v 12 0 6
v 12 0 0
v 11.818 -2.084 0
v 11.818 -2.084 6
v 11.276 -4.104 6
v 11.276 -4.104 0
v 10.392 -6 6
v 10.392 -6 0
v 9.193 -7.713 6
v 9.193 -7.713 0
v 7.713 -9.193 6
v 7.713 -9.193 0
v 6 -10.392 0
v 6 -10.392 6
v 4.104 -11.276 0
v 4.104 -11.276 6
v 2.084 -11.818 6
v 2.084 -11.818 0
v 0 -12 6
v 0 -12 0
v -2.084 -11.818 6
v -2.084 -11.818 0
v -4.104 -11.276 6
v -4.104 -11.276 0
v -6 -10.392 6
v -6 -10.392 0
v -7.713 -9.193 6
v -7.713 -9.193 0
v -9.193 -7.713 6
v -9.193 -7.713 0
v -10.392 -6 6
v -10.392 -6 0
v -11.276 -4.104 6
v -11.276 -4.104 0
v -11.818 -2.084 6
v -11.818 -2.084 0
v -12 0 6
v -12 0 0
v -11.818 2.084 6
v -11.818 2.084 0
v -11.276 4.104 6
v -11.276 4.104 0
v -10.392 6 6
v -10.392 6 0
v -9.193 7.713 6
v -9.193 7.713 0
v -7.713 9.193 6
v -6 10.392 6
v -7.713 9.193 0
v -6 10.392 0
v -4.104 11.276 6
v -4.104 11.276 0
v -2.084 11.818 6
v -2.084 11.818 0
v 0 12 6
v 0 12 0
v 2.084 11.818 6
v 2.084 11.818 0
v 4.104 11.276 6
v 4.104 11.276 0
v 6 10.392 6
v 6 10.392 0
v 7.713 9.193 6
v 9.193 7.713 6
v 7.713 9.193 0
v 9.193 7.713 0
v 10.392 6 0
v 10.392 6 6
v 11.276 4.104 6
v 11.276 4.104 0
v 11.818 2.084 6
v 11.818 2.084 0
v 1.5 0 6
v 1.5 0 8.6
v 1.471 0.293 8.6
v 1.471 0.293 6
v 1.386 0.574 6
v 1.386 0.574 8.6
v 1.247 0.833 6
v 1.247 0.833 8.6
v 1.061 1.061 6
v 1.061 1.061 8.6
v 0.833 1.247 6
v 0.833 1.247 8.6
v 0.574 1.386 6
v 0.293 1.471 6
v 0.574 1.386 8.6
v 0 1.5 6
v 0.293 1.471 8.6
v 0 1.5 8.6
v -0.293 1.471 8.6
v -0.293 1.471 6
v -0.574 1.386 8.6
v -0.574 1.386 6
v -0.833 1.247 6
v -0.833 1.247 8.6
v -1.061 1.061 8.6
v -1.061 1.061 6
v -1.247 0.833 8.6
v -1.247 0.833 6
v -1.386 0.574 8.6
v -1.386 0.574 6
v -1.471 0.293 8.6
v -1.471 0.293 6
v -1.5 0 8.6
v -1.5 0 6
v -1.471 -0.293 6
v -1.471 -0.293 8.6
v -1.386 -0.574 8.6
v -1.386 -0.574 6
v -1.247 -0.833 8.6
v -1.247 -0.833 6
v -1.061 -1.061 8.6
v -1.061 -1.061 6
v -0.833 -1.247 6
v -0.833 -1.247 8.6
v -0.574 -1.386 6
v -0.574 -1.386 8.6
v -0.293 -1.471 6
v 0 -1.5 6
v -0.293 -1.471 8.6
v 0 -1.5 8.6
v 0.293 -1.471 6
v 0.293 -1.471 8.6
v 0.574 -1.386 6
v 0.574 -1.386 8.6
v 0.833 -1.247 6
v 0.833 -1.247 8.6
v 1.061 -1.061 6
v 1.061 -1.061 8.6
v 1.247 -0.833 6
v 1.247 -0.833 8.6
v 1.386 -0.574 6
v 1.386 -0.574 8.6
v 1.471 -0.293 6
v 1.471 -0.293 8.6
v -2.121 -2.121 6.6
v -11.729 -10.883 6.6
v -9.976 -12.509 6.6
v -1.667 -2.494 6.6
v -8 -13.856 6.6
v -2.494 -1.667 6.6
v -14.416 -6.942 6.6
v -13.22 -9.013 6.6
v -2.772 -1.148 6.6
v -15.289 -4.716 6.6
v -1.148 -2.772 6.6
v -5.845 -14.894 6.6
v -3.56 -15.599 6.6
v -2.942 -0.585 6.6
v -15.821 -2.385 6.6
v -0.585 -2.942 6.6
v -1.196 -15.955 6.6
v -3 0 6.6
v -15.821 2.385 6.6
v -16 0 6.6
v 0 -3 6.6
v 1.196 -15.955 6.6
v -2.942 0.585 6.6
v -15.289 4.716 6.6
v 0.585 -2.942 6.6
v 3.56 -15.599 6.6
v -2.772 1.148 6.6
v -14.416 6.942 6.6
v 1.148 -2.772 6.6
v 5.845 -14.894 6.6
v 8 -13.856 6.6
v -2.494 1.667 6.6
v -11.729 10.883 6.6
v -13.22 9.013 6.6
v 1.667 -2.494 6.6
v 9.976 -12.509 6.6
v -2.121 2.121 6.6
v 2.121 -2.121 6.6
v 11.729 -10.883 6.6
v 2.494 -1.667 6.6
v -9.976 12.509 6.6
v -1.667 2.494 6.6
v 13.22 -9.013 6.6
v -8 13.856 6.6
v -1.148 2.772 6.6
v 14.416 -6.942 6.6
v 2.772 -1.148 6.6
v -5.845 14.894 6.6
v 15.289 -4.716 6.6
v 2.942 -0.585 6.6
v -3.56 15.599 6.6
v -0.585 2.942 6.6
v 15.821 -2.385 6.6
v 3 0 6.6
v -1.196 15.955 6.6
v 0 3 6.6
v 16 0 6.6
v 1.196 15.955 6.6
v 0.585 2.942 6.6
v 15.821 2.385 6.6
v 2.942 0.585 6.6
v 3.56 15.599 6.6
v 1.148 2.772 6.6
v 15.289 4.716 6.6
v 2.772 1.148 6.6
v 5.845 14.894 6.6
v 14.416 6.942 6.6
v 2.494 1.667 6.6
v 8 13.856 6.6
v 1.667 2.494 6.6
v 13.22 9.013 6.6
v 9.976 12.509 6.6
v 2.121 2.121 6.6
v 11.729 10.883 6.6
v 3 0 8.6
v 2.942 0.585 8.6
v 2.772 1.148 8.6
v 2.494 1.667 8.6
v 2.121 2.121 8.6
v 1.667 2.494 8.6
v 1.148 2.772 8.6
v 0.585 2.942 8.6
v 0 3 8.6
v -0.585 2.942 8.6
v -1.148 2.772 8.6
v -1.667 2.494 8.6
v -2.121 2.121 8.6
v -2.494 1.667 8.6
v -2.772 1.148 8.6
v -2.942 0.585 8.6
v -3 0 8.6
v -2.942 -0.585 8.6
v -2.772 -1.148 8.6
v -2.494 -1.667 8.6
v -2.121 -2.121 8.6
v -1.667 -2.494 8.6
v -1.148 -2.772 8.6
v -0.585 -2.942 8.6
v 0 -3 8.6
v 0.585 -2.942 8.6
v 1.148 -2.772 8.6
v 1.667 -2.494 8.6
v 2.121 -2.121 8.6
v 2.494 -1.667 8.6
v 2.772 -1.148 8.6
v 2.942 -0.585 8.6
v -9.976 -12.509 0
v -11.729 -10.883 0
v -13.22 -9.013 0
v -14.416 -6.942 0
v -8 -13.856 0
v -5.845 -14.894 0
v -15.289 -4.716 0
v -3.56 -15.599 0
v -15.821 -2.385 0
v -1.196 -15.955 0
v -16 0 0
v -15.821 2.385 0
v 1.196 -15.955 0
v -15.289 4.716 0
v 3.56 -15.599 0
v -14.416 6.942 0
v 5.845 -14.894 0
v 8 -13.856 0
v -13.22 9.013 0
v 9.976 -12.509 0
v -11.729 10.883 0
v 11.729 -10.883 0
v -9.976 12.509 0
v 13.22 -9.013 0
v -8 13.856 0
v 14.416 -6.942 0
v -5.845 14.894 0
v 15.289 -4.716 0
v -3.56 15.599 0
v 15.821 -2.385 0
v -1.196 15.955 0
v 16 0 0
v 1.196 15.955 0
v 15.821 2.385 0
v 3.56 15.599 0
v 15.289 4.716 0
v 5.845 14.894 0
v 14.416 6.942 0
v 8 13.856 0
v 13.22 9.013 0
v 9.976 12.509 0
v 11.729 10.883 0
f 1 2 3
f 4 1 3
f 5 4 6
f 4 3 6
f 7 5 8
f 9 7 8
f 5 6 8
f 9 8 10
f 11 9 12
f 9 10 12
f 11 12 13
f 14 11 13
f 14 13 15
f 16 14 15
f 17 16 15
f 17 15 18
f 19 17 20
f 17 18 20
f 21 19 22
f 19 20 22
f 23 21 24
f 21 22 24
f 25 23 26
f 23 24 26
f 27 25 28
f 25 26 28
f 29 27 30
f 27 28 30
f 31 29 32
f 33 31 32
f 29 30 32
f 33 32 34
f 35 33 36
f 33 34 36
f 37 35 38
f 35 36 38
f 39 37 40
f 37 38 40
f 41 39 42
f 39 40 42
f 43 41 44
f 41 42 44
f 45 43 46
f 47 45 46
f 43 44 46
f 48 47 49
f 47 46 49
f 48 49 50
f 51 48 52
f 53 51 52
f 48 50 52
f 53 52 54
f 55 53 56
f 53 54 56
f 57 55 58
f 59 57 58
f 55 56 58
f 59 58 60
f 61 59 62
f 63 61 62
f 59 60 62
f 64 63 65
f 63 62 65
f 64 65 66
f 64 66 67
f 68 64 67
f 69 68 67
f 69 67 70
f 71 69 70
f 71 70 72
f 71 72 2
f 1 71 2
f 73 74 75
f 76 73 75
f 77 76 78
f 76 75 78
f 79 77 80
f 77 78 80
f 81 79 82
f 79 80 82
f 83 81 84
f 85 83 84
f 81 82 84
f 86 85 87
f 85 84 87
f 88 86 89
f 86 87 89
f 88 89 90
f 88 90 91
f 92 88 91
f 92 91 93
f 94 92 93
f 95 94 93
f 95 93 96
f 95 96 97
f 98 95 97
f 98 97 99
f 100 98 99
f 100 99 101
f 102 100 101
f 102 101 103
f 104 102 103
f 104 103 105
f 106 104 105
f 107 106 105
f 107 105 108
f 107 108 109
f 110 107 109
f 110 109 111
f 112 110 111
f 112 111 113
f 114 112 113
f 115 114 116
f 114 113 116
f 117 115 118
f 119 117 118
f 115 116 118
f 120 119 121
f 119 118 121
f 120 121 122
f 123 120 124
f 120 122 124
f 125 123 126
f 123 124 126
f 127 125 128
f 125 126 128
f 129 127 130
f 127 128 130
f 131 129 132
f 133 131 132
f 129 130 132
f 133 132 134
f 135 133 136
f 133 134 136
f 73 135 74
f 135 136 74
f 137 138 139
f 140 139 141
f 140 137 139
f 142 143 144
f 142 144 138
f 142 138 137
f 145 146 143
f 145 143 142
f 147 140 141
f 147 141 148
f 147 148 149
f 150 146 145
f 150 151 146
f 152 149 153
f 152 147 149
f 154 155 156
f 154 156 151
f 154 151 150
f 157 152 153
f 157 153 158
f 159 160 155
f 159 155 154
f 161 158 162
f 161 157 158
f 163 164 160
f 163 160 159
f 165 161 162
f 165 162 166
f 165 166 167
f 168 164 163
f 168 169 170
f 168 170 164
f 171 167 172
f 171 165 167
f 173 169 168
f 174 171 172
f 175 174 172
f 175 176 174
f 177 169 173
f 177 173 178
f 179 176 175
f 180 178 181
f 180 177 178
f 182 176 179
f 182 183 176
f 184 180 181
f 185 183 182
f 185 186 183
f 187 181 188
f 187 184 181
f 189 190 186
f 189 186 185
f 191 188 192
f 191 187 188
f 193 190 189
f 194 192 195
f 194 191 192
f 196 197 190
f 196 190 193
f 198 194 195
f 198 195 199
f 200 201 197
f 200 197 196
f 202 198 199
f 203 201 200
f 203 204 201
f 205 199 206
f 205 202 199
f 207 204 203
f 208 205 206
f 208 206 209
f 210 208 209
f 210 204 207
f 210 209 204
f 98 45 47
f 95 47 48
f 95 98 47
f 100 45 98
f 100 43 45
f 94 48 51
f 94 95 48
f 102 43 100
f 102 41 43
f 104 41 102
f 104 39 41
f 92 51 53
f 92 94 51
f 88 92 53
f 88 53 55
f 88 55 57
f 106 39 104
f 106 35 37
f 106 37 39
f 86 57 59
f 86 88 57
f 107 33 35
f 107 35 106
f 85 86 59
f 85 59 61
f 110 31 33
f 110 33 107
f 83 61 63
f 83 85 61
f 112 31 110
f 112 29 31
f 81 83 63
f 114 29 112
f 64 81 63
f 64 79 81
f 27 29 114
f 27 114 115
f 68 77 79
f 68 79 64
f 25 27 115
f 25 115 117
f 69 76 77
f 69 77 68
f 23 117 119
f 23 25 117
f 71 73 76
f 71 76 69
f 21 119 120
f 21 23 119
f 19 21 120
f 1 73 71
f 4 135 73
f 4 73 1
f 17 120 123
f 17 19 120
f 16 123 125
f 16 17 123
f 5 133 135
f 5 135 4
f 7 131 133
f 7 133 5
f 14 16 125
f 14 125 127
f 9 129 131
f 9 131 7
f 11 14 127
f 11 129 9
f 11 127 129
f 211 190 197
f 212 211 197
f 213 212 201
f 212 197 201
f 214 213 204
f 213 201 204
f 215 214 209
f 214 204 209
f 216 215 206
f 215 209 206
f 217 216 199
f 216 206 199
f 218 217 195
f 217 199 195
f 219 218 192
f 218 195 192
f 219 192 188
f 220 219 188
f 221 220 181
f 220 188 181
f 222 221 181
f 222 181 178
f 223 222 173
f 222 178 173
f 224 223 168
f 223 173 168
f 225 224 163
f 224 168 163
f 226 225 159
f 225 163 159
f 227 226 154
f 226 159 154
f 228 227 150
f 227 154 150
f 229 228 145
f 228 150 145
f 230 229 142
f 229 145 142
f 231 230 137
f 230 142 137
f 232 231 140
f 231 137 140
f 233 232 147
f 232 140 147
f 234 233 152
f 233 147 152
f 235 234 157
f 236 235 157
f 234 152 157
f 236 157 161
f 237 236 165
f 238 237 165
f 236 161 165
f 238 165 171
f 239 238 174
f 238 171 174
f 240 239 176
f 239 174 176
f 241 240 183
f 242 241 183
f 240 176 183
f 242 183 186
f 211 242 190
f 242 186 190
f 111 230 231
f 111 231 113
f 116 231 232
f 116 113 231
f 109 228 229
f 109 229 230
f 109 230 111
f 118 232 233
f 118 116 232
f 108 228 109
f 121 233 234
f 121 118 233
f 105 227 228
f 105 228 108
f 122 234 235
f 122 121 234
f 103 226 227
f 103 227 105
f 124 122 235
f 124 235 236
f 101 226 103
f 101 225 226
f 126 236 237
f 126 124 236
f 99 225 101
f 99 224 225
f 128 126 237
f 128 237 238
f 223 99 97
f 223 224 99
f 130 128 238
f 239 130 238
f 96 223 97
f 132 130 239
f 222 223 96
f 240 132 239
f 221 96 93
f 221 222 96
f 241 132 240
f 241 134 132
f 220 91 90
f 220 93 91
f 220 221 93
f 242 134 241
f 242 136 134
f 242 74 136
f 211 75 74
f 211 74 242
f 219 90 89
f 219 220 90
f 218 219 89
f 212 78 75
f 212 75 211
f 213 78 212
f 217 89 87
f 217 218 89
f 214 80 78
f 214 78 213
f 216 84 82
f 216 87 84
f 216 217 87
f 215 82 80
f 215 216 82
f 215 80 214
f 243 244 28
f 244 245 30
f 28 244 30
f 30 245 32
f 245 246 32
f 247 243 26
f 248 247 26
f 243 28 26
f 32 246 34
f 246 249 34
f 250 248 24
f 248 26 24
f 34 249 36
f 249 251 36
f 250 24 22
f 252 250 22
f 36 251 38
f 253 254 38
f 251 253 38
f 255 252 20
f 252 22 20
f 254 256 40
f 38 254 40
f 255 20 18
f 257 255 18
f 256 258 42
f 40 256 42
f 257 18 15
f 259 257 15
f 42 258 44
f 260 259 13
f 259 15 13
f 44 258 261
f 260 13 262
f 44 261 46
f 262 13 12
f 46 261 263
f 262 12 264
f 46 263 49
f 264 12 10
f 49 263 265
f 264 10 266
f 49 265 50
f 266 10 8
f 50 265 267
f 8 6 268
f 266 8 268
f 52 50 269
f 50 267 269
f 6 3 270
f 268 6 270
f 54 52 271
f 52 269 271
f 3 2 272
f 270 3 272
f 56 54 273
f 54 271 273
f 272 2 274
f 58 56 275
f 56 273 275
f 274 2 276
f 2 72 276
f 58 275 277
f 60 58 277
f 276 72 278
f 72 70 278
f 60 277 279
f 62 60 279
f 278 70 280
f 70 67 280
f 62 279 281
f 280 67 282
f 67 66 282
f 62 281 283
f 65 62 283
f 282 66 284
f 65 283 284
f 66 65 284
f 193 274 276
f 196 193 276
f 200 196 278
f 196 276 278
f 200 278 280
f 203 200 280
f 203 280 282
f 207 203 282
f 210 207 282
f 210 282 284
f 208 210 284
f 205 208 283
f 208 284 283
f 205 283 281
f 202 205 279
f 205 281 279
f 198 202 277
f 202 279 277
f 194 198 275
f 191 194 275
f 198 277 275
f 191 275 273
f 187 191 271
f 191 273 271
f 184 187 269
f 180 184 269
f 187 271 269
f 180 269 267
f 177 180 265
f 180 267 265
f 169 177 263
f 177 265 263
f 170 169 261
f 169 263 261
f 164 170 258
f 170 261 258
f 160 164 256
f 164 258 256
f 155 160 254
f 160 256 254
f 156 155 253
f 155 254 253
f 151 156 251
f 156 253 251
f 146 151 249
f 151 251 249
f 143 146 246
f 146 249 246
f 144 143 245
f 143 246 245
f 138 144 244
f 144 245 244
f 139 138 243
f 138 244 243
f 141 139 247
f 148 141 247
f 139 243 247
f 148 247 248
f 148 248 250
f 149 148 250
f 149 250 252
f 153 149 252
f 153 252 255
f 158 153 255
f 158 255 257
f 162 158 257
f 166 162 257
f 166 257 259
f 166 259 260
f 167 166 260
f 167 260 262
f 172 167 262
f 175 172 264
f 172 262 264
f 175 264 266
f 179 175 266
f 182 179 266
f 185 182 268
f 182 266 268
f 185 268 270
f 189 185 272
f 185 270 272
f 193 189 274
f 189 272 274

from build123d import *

# Parameters (mm, degrees)
F0_R     = 16
F1_DEPTH = 6.6
F2_R     = 3
F3_DEPTH = 2
F4_R     = 1.5
F5_DEPTH = 8.601
F6_R     = 12
F7_DEPTH = 6


with BuildPart() as f1:
    # F0 (on Top) → F1 (new body)
    with BuildSketch(Plane.XY):
        Circle(F0_R)
    extrude(amount=F1_DEPTH)

    # F2 (on face) → F3 (join)
    with BuildSketch(Plane.XY.offset(6.6)):
        Circle(F2_R)
    extrude(amount=F3_DEPTH)

    # F4 (on face) → F5 (cut, through all)
    with BuildSketch(Plane.XY.offset(8.6)):
        Circle(F4_R)
    extrude(amount=-F5_DEPTH, mode=Mode.SUBTRACT)

    # F6 (on face) → F7 (cut)
    with BuildSketch(Plane(origin=(0, 0, 0), x_dir=(1, 0, 0), z_dir=(0, 0, -1))):
        Circle(F6_R)
    extrude(amount=-F7_DEPTH, mode=Mode.SUBTRACT)


solid = f1.part
